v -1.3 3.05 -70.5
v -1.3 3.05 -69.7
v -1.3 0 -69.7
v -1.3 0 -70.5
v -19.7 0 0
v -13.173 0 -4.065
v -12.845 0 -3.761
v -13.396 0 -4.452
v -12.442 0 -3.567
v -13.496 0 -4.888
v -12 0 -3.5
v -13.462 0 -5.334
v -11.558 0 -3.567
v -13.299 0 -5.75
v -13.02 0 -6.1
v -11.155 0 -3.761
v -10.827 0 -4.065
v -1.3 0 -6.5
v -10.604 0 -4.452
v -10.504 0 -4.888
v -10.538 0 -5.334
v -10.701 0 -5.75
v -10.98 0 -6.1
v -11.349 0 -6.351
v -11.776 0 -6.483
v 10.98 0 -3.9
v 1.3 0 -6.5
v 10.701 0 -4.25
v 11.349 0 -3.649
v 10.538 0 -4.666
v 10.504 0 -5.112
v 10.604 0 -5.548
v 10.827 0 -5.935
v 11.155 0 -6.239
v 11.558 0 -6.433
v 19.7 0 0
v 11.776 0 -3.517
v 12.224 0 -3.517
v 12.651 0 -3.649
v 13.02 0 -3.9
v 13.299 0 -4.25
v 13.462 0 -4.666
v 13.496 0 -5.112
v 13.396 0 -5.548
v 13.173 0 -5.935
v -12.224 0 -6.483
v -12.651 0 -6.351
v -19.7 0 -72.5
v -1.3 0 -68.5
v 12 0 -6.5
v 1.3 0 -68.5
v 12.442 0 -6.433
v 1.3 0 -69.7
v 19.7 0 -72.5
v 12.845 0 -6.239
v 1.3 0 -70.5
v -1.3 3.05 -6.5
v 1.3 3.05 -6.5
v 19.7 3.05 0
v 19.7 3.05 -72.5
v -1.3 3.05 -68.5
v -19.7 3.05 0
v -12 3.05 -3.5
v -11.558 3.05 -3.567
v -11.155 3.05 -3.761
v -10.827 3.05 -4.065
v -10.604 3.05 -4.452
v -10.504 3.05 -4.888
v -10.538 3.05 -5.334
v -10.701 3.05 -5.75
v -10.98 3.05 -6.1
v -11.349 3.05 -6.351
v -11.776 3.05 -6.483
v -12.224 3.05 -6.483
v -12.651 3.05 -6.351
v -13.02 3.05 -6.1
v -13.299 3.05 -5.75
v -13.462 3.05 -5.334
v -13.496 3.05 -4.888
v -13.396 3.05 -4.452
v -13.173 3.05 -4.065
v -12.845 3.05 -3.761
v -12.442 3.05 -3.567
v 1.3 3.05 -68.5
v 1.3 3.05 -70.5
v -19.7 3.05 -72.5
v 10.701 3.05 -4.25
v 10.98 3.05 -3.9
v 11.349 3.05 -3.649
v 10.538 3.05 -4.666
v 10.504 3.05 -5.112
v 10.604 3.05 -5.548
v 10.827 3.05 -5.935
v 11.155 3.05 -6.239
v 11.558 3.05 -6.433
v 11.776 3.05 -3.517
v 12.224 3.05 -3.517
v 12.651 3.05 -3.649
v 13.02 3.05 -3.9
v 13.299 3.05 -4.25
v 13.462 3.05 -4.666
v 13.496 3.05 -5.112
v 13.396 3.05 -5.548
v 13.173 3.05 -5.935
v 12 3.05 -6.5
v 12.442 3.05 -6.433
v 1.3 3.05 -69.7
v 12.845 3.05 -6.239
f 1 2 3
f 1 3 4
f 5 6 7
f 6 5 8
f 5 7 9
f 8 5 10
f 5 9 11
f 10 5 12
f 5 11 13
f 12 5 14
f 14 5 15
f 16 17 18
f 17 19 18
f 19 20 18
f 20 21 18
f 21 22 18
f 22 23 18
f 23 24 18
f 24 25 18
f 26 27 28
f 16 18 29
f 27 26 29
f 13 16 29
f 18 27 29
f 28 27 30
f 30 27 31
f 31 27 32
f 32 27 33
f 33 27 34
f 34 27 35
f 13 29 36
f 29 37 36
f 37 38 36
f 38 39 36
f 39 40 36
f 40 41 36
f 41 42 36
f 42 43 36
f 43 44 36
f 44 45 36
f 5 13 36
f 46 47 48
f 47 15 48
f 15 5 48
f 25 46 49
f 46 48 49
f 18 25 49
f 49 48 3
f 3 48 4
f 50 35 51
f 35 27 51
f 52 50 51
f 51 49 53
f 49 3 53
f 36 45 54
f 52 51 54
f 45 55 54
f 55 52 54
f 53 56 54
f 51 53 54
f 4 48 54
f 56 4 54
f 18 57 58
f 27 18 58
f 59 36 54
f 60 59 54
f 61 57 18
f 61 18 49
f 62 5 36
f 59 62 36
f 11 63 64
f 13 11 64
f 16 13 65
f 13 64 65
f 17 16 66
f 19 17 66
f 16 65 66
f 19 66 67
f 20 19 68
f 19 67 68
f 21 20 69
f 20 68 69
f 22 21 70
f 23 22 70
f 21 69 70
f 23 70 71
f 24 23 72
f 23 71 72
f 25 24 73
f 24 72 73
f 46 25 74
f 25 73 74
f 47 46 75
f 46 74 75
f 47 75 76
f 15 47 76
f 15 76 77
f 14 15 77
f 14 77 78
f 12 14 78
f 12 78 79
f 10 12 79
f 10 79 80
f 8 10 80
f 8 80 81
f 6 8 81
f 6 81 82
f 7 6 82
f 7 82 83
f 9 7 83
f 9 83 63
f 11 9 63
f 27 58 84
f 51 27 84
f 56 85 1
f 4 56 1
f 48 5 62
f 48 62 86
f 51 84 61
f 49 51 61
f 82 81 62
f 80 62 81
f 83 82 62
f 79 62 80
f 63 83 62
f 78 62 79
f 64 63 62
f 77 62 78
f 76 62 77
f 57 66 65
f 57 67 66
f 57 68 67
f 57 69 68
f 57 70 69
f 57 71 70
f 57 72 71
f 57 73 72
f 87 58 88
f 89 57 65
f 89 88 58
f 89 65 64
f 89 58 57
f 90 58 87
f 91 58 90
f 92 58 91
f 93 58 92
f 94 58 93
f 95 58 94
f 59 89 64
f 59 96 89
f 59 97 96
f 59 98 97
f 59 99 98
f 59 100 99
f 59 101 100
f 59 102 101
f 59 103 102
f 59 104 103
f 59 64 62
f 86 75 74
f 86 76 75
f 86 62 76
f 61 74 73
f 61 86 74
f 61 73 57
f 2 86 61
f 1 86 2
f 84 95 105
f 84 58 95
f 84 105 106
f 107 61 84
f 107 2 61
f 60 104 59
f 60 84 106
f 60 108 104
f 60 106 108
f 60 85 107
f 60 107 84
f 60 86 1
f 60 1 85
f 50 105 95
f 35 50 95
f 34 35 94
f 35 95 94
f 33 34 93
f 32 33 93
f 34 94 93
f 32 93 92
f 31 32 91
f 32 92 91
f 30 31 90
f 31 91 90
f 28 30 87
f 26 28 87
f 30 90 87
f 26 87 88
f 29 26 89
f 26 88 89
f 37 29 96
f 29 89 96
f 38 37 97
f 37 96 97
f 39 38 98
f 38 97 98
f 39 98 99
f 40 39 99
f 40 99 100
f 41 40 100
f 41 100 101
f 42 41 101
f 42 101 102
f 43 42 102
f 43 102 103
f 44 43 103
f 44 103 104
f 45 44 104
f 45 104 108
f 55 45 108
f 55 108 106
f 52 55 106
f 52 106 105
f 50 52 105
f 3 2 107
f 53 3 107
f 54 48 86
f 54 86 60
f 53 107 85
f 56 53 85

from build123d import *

# Parameters (mm, degrees)
SKETCH1_W           = 39.4
SKETCH1_H           = 72.5
BOSS_EXTRUDE1_DEPTH = 3.05
SKETCH4_W           = 1.3
SKETCH4_H           = 0.8
SKETCH4_H_2         = 62
CUT_EXTRUDE1_DEPTH  = 76.190707538
SKETCH7_R           = 1.5
CUT_EXTRUDE4_DEPTH  = 76.190707538


with BuildPart() as part:
    # Sketch1 → Boss-Extrude1 (new body)
    with BuildSketch(Plane(origin=(0, 0, 0), x_dir=(1, 0, 0), z_dir=(0, 1, 0))):
        with Locations((0, 36.25)):
            Rectangle(SKETCH1_W, SKETCH1_H)
    extrude(amount=BOSS_EXTRUDE1_DEPTH)

    # Sketch4 → Cut-Extrude1 (cut, through all)
    with BuildSketch(Plane(origin=(0, 3.05, 0), x_dir=(1, 0, 0), z_dir=(0, 1, 0))):
        with Locations((-0.65, 70.1)):
            Rectangle(SKETCH4_W, SKETCH4_H)
        with Locations((-0.65, 37.5)):
            Rectangle(SKETCH4_W, SKETCH4_H_2)
        with Locations((0.65, 37.5)):
            Rectangle(SKETCH4_W, SKETCH4_H_2)
        with Locations((0.65, 70.1)):
            Rectangle(SKETCH4_W, SKETCH4_H)
    extrude(amount=-CUT_EXTRUDE1_DEPTH, mode=Mode.SUBTRACT)

    # Sketch7 → Cut-Extrude4 (cut, through all)
    with BuildSketch(Plane(origin=(0, 3.05, 0), x_dir=(1, 0, 0), z_dir=(0, 1, 0))):
        with Locations(Location((-12, 5, 0), (0, 0, 270))):
            Circle(SKETCH7_R)
        with Locations(Location((12, 5, 0), (0, 0, 90))):
            Circle(SKETCH7_R)
    extrude(amount=-CUT_EXTRUDE4_DEPTH, mode=Mode.SUBTRACT)


solid = part.part
